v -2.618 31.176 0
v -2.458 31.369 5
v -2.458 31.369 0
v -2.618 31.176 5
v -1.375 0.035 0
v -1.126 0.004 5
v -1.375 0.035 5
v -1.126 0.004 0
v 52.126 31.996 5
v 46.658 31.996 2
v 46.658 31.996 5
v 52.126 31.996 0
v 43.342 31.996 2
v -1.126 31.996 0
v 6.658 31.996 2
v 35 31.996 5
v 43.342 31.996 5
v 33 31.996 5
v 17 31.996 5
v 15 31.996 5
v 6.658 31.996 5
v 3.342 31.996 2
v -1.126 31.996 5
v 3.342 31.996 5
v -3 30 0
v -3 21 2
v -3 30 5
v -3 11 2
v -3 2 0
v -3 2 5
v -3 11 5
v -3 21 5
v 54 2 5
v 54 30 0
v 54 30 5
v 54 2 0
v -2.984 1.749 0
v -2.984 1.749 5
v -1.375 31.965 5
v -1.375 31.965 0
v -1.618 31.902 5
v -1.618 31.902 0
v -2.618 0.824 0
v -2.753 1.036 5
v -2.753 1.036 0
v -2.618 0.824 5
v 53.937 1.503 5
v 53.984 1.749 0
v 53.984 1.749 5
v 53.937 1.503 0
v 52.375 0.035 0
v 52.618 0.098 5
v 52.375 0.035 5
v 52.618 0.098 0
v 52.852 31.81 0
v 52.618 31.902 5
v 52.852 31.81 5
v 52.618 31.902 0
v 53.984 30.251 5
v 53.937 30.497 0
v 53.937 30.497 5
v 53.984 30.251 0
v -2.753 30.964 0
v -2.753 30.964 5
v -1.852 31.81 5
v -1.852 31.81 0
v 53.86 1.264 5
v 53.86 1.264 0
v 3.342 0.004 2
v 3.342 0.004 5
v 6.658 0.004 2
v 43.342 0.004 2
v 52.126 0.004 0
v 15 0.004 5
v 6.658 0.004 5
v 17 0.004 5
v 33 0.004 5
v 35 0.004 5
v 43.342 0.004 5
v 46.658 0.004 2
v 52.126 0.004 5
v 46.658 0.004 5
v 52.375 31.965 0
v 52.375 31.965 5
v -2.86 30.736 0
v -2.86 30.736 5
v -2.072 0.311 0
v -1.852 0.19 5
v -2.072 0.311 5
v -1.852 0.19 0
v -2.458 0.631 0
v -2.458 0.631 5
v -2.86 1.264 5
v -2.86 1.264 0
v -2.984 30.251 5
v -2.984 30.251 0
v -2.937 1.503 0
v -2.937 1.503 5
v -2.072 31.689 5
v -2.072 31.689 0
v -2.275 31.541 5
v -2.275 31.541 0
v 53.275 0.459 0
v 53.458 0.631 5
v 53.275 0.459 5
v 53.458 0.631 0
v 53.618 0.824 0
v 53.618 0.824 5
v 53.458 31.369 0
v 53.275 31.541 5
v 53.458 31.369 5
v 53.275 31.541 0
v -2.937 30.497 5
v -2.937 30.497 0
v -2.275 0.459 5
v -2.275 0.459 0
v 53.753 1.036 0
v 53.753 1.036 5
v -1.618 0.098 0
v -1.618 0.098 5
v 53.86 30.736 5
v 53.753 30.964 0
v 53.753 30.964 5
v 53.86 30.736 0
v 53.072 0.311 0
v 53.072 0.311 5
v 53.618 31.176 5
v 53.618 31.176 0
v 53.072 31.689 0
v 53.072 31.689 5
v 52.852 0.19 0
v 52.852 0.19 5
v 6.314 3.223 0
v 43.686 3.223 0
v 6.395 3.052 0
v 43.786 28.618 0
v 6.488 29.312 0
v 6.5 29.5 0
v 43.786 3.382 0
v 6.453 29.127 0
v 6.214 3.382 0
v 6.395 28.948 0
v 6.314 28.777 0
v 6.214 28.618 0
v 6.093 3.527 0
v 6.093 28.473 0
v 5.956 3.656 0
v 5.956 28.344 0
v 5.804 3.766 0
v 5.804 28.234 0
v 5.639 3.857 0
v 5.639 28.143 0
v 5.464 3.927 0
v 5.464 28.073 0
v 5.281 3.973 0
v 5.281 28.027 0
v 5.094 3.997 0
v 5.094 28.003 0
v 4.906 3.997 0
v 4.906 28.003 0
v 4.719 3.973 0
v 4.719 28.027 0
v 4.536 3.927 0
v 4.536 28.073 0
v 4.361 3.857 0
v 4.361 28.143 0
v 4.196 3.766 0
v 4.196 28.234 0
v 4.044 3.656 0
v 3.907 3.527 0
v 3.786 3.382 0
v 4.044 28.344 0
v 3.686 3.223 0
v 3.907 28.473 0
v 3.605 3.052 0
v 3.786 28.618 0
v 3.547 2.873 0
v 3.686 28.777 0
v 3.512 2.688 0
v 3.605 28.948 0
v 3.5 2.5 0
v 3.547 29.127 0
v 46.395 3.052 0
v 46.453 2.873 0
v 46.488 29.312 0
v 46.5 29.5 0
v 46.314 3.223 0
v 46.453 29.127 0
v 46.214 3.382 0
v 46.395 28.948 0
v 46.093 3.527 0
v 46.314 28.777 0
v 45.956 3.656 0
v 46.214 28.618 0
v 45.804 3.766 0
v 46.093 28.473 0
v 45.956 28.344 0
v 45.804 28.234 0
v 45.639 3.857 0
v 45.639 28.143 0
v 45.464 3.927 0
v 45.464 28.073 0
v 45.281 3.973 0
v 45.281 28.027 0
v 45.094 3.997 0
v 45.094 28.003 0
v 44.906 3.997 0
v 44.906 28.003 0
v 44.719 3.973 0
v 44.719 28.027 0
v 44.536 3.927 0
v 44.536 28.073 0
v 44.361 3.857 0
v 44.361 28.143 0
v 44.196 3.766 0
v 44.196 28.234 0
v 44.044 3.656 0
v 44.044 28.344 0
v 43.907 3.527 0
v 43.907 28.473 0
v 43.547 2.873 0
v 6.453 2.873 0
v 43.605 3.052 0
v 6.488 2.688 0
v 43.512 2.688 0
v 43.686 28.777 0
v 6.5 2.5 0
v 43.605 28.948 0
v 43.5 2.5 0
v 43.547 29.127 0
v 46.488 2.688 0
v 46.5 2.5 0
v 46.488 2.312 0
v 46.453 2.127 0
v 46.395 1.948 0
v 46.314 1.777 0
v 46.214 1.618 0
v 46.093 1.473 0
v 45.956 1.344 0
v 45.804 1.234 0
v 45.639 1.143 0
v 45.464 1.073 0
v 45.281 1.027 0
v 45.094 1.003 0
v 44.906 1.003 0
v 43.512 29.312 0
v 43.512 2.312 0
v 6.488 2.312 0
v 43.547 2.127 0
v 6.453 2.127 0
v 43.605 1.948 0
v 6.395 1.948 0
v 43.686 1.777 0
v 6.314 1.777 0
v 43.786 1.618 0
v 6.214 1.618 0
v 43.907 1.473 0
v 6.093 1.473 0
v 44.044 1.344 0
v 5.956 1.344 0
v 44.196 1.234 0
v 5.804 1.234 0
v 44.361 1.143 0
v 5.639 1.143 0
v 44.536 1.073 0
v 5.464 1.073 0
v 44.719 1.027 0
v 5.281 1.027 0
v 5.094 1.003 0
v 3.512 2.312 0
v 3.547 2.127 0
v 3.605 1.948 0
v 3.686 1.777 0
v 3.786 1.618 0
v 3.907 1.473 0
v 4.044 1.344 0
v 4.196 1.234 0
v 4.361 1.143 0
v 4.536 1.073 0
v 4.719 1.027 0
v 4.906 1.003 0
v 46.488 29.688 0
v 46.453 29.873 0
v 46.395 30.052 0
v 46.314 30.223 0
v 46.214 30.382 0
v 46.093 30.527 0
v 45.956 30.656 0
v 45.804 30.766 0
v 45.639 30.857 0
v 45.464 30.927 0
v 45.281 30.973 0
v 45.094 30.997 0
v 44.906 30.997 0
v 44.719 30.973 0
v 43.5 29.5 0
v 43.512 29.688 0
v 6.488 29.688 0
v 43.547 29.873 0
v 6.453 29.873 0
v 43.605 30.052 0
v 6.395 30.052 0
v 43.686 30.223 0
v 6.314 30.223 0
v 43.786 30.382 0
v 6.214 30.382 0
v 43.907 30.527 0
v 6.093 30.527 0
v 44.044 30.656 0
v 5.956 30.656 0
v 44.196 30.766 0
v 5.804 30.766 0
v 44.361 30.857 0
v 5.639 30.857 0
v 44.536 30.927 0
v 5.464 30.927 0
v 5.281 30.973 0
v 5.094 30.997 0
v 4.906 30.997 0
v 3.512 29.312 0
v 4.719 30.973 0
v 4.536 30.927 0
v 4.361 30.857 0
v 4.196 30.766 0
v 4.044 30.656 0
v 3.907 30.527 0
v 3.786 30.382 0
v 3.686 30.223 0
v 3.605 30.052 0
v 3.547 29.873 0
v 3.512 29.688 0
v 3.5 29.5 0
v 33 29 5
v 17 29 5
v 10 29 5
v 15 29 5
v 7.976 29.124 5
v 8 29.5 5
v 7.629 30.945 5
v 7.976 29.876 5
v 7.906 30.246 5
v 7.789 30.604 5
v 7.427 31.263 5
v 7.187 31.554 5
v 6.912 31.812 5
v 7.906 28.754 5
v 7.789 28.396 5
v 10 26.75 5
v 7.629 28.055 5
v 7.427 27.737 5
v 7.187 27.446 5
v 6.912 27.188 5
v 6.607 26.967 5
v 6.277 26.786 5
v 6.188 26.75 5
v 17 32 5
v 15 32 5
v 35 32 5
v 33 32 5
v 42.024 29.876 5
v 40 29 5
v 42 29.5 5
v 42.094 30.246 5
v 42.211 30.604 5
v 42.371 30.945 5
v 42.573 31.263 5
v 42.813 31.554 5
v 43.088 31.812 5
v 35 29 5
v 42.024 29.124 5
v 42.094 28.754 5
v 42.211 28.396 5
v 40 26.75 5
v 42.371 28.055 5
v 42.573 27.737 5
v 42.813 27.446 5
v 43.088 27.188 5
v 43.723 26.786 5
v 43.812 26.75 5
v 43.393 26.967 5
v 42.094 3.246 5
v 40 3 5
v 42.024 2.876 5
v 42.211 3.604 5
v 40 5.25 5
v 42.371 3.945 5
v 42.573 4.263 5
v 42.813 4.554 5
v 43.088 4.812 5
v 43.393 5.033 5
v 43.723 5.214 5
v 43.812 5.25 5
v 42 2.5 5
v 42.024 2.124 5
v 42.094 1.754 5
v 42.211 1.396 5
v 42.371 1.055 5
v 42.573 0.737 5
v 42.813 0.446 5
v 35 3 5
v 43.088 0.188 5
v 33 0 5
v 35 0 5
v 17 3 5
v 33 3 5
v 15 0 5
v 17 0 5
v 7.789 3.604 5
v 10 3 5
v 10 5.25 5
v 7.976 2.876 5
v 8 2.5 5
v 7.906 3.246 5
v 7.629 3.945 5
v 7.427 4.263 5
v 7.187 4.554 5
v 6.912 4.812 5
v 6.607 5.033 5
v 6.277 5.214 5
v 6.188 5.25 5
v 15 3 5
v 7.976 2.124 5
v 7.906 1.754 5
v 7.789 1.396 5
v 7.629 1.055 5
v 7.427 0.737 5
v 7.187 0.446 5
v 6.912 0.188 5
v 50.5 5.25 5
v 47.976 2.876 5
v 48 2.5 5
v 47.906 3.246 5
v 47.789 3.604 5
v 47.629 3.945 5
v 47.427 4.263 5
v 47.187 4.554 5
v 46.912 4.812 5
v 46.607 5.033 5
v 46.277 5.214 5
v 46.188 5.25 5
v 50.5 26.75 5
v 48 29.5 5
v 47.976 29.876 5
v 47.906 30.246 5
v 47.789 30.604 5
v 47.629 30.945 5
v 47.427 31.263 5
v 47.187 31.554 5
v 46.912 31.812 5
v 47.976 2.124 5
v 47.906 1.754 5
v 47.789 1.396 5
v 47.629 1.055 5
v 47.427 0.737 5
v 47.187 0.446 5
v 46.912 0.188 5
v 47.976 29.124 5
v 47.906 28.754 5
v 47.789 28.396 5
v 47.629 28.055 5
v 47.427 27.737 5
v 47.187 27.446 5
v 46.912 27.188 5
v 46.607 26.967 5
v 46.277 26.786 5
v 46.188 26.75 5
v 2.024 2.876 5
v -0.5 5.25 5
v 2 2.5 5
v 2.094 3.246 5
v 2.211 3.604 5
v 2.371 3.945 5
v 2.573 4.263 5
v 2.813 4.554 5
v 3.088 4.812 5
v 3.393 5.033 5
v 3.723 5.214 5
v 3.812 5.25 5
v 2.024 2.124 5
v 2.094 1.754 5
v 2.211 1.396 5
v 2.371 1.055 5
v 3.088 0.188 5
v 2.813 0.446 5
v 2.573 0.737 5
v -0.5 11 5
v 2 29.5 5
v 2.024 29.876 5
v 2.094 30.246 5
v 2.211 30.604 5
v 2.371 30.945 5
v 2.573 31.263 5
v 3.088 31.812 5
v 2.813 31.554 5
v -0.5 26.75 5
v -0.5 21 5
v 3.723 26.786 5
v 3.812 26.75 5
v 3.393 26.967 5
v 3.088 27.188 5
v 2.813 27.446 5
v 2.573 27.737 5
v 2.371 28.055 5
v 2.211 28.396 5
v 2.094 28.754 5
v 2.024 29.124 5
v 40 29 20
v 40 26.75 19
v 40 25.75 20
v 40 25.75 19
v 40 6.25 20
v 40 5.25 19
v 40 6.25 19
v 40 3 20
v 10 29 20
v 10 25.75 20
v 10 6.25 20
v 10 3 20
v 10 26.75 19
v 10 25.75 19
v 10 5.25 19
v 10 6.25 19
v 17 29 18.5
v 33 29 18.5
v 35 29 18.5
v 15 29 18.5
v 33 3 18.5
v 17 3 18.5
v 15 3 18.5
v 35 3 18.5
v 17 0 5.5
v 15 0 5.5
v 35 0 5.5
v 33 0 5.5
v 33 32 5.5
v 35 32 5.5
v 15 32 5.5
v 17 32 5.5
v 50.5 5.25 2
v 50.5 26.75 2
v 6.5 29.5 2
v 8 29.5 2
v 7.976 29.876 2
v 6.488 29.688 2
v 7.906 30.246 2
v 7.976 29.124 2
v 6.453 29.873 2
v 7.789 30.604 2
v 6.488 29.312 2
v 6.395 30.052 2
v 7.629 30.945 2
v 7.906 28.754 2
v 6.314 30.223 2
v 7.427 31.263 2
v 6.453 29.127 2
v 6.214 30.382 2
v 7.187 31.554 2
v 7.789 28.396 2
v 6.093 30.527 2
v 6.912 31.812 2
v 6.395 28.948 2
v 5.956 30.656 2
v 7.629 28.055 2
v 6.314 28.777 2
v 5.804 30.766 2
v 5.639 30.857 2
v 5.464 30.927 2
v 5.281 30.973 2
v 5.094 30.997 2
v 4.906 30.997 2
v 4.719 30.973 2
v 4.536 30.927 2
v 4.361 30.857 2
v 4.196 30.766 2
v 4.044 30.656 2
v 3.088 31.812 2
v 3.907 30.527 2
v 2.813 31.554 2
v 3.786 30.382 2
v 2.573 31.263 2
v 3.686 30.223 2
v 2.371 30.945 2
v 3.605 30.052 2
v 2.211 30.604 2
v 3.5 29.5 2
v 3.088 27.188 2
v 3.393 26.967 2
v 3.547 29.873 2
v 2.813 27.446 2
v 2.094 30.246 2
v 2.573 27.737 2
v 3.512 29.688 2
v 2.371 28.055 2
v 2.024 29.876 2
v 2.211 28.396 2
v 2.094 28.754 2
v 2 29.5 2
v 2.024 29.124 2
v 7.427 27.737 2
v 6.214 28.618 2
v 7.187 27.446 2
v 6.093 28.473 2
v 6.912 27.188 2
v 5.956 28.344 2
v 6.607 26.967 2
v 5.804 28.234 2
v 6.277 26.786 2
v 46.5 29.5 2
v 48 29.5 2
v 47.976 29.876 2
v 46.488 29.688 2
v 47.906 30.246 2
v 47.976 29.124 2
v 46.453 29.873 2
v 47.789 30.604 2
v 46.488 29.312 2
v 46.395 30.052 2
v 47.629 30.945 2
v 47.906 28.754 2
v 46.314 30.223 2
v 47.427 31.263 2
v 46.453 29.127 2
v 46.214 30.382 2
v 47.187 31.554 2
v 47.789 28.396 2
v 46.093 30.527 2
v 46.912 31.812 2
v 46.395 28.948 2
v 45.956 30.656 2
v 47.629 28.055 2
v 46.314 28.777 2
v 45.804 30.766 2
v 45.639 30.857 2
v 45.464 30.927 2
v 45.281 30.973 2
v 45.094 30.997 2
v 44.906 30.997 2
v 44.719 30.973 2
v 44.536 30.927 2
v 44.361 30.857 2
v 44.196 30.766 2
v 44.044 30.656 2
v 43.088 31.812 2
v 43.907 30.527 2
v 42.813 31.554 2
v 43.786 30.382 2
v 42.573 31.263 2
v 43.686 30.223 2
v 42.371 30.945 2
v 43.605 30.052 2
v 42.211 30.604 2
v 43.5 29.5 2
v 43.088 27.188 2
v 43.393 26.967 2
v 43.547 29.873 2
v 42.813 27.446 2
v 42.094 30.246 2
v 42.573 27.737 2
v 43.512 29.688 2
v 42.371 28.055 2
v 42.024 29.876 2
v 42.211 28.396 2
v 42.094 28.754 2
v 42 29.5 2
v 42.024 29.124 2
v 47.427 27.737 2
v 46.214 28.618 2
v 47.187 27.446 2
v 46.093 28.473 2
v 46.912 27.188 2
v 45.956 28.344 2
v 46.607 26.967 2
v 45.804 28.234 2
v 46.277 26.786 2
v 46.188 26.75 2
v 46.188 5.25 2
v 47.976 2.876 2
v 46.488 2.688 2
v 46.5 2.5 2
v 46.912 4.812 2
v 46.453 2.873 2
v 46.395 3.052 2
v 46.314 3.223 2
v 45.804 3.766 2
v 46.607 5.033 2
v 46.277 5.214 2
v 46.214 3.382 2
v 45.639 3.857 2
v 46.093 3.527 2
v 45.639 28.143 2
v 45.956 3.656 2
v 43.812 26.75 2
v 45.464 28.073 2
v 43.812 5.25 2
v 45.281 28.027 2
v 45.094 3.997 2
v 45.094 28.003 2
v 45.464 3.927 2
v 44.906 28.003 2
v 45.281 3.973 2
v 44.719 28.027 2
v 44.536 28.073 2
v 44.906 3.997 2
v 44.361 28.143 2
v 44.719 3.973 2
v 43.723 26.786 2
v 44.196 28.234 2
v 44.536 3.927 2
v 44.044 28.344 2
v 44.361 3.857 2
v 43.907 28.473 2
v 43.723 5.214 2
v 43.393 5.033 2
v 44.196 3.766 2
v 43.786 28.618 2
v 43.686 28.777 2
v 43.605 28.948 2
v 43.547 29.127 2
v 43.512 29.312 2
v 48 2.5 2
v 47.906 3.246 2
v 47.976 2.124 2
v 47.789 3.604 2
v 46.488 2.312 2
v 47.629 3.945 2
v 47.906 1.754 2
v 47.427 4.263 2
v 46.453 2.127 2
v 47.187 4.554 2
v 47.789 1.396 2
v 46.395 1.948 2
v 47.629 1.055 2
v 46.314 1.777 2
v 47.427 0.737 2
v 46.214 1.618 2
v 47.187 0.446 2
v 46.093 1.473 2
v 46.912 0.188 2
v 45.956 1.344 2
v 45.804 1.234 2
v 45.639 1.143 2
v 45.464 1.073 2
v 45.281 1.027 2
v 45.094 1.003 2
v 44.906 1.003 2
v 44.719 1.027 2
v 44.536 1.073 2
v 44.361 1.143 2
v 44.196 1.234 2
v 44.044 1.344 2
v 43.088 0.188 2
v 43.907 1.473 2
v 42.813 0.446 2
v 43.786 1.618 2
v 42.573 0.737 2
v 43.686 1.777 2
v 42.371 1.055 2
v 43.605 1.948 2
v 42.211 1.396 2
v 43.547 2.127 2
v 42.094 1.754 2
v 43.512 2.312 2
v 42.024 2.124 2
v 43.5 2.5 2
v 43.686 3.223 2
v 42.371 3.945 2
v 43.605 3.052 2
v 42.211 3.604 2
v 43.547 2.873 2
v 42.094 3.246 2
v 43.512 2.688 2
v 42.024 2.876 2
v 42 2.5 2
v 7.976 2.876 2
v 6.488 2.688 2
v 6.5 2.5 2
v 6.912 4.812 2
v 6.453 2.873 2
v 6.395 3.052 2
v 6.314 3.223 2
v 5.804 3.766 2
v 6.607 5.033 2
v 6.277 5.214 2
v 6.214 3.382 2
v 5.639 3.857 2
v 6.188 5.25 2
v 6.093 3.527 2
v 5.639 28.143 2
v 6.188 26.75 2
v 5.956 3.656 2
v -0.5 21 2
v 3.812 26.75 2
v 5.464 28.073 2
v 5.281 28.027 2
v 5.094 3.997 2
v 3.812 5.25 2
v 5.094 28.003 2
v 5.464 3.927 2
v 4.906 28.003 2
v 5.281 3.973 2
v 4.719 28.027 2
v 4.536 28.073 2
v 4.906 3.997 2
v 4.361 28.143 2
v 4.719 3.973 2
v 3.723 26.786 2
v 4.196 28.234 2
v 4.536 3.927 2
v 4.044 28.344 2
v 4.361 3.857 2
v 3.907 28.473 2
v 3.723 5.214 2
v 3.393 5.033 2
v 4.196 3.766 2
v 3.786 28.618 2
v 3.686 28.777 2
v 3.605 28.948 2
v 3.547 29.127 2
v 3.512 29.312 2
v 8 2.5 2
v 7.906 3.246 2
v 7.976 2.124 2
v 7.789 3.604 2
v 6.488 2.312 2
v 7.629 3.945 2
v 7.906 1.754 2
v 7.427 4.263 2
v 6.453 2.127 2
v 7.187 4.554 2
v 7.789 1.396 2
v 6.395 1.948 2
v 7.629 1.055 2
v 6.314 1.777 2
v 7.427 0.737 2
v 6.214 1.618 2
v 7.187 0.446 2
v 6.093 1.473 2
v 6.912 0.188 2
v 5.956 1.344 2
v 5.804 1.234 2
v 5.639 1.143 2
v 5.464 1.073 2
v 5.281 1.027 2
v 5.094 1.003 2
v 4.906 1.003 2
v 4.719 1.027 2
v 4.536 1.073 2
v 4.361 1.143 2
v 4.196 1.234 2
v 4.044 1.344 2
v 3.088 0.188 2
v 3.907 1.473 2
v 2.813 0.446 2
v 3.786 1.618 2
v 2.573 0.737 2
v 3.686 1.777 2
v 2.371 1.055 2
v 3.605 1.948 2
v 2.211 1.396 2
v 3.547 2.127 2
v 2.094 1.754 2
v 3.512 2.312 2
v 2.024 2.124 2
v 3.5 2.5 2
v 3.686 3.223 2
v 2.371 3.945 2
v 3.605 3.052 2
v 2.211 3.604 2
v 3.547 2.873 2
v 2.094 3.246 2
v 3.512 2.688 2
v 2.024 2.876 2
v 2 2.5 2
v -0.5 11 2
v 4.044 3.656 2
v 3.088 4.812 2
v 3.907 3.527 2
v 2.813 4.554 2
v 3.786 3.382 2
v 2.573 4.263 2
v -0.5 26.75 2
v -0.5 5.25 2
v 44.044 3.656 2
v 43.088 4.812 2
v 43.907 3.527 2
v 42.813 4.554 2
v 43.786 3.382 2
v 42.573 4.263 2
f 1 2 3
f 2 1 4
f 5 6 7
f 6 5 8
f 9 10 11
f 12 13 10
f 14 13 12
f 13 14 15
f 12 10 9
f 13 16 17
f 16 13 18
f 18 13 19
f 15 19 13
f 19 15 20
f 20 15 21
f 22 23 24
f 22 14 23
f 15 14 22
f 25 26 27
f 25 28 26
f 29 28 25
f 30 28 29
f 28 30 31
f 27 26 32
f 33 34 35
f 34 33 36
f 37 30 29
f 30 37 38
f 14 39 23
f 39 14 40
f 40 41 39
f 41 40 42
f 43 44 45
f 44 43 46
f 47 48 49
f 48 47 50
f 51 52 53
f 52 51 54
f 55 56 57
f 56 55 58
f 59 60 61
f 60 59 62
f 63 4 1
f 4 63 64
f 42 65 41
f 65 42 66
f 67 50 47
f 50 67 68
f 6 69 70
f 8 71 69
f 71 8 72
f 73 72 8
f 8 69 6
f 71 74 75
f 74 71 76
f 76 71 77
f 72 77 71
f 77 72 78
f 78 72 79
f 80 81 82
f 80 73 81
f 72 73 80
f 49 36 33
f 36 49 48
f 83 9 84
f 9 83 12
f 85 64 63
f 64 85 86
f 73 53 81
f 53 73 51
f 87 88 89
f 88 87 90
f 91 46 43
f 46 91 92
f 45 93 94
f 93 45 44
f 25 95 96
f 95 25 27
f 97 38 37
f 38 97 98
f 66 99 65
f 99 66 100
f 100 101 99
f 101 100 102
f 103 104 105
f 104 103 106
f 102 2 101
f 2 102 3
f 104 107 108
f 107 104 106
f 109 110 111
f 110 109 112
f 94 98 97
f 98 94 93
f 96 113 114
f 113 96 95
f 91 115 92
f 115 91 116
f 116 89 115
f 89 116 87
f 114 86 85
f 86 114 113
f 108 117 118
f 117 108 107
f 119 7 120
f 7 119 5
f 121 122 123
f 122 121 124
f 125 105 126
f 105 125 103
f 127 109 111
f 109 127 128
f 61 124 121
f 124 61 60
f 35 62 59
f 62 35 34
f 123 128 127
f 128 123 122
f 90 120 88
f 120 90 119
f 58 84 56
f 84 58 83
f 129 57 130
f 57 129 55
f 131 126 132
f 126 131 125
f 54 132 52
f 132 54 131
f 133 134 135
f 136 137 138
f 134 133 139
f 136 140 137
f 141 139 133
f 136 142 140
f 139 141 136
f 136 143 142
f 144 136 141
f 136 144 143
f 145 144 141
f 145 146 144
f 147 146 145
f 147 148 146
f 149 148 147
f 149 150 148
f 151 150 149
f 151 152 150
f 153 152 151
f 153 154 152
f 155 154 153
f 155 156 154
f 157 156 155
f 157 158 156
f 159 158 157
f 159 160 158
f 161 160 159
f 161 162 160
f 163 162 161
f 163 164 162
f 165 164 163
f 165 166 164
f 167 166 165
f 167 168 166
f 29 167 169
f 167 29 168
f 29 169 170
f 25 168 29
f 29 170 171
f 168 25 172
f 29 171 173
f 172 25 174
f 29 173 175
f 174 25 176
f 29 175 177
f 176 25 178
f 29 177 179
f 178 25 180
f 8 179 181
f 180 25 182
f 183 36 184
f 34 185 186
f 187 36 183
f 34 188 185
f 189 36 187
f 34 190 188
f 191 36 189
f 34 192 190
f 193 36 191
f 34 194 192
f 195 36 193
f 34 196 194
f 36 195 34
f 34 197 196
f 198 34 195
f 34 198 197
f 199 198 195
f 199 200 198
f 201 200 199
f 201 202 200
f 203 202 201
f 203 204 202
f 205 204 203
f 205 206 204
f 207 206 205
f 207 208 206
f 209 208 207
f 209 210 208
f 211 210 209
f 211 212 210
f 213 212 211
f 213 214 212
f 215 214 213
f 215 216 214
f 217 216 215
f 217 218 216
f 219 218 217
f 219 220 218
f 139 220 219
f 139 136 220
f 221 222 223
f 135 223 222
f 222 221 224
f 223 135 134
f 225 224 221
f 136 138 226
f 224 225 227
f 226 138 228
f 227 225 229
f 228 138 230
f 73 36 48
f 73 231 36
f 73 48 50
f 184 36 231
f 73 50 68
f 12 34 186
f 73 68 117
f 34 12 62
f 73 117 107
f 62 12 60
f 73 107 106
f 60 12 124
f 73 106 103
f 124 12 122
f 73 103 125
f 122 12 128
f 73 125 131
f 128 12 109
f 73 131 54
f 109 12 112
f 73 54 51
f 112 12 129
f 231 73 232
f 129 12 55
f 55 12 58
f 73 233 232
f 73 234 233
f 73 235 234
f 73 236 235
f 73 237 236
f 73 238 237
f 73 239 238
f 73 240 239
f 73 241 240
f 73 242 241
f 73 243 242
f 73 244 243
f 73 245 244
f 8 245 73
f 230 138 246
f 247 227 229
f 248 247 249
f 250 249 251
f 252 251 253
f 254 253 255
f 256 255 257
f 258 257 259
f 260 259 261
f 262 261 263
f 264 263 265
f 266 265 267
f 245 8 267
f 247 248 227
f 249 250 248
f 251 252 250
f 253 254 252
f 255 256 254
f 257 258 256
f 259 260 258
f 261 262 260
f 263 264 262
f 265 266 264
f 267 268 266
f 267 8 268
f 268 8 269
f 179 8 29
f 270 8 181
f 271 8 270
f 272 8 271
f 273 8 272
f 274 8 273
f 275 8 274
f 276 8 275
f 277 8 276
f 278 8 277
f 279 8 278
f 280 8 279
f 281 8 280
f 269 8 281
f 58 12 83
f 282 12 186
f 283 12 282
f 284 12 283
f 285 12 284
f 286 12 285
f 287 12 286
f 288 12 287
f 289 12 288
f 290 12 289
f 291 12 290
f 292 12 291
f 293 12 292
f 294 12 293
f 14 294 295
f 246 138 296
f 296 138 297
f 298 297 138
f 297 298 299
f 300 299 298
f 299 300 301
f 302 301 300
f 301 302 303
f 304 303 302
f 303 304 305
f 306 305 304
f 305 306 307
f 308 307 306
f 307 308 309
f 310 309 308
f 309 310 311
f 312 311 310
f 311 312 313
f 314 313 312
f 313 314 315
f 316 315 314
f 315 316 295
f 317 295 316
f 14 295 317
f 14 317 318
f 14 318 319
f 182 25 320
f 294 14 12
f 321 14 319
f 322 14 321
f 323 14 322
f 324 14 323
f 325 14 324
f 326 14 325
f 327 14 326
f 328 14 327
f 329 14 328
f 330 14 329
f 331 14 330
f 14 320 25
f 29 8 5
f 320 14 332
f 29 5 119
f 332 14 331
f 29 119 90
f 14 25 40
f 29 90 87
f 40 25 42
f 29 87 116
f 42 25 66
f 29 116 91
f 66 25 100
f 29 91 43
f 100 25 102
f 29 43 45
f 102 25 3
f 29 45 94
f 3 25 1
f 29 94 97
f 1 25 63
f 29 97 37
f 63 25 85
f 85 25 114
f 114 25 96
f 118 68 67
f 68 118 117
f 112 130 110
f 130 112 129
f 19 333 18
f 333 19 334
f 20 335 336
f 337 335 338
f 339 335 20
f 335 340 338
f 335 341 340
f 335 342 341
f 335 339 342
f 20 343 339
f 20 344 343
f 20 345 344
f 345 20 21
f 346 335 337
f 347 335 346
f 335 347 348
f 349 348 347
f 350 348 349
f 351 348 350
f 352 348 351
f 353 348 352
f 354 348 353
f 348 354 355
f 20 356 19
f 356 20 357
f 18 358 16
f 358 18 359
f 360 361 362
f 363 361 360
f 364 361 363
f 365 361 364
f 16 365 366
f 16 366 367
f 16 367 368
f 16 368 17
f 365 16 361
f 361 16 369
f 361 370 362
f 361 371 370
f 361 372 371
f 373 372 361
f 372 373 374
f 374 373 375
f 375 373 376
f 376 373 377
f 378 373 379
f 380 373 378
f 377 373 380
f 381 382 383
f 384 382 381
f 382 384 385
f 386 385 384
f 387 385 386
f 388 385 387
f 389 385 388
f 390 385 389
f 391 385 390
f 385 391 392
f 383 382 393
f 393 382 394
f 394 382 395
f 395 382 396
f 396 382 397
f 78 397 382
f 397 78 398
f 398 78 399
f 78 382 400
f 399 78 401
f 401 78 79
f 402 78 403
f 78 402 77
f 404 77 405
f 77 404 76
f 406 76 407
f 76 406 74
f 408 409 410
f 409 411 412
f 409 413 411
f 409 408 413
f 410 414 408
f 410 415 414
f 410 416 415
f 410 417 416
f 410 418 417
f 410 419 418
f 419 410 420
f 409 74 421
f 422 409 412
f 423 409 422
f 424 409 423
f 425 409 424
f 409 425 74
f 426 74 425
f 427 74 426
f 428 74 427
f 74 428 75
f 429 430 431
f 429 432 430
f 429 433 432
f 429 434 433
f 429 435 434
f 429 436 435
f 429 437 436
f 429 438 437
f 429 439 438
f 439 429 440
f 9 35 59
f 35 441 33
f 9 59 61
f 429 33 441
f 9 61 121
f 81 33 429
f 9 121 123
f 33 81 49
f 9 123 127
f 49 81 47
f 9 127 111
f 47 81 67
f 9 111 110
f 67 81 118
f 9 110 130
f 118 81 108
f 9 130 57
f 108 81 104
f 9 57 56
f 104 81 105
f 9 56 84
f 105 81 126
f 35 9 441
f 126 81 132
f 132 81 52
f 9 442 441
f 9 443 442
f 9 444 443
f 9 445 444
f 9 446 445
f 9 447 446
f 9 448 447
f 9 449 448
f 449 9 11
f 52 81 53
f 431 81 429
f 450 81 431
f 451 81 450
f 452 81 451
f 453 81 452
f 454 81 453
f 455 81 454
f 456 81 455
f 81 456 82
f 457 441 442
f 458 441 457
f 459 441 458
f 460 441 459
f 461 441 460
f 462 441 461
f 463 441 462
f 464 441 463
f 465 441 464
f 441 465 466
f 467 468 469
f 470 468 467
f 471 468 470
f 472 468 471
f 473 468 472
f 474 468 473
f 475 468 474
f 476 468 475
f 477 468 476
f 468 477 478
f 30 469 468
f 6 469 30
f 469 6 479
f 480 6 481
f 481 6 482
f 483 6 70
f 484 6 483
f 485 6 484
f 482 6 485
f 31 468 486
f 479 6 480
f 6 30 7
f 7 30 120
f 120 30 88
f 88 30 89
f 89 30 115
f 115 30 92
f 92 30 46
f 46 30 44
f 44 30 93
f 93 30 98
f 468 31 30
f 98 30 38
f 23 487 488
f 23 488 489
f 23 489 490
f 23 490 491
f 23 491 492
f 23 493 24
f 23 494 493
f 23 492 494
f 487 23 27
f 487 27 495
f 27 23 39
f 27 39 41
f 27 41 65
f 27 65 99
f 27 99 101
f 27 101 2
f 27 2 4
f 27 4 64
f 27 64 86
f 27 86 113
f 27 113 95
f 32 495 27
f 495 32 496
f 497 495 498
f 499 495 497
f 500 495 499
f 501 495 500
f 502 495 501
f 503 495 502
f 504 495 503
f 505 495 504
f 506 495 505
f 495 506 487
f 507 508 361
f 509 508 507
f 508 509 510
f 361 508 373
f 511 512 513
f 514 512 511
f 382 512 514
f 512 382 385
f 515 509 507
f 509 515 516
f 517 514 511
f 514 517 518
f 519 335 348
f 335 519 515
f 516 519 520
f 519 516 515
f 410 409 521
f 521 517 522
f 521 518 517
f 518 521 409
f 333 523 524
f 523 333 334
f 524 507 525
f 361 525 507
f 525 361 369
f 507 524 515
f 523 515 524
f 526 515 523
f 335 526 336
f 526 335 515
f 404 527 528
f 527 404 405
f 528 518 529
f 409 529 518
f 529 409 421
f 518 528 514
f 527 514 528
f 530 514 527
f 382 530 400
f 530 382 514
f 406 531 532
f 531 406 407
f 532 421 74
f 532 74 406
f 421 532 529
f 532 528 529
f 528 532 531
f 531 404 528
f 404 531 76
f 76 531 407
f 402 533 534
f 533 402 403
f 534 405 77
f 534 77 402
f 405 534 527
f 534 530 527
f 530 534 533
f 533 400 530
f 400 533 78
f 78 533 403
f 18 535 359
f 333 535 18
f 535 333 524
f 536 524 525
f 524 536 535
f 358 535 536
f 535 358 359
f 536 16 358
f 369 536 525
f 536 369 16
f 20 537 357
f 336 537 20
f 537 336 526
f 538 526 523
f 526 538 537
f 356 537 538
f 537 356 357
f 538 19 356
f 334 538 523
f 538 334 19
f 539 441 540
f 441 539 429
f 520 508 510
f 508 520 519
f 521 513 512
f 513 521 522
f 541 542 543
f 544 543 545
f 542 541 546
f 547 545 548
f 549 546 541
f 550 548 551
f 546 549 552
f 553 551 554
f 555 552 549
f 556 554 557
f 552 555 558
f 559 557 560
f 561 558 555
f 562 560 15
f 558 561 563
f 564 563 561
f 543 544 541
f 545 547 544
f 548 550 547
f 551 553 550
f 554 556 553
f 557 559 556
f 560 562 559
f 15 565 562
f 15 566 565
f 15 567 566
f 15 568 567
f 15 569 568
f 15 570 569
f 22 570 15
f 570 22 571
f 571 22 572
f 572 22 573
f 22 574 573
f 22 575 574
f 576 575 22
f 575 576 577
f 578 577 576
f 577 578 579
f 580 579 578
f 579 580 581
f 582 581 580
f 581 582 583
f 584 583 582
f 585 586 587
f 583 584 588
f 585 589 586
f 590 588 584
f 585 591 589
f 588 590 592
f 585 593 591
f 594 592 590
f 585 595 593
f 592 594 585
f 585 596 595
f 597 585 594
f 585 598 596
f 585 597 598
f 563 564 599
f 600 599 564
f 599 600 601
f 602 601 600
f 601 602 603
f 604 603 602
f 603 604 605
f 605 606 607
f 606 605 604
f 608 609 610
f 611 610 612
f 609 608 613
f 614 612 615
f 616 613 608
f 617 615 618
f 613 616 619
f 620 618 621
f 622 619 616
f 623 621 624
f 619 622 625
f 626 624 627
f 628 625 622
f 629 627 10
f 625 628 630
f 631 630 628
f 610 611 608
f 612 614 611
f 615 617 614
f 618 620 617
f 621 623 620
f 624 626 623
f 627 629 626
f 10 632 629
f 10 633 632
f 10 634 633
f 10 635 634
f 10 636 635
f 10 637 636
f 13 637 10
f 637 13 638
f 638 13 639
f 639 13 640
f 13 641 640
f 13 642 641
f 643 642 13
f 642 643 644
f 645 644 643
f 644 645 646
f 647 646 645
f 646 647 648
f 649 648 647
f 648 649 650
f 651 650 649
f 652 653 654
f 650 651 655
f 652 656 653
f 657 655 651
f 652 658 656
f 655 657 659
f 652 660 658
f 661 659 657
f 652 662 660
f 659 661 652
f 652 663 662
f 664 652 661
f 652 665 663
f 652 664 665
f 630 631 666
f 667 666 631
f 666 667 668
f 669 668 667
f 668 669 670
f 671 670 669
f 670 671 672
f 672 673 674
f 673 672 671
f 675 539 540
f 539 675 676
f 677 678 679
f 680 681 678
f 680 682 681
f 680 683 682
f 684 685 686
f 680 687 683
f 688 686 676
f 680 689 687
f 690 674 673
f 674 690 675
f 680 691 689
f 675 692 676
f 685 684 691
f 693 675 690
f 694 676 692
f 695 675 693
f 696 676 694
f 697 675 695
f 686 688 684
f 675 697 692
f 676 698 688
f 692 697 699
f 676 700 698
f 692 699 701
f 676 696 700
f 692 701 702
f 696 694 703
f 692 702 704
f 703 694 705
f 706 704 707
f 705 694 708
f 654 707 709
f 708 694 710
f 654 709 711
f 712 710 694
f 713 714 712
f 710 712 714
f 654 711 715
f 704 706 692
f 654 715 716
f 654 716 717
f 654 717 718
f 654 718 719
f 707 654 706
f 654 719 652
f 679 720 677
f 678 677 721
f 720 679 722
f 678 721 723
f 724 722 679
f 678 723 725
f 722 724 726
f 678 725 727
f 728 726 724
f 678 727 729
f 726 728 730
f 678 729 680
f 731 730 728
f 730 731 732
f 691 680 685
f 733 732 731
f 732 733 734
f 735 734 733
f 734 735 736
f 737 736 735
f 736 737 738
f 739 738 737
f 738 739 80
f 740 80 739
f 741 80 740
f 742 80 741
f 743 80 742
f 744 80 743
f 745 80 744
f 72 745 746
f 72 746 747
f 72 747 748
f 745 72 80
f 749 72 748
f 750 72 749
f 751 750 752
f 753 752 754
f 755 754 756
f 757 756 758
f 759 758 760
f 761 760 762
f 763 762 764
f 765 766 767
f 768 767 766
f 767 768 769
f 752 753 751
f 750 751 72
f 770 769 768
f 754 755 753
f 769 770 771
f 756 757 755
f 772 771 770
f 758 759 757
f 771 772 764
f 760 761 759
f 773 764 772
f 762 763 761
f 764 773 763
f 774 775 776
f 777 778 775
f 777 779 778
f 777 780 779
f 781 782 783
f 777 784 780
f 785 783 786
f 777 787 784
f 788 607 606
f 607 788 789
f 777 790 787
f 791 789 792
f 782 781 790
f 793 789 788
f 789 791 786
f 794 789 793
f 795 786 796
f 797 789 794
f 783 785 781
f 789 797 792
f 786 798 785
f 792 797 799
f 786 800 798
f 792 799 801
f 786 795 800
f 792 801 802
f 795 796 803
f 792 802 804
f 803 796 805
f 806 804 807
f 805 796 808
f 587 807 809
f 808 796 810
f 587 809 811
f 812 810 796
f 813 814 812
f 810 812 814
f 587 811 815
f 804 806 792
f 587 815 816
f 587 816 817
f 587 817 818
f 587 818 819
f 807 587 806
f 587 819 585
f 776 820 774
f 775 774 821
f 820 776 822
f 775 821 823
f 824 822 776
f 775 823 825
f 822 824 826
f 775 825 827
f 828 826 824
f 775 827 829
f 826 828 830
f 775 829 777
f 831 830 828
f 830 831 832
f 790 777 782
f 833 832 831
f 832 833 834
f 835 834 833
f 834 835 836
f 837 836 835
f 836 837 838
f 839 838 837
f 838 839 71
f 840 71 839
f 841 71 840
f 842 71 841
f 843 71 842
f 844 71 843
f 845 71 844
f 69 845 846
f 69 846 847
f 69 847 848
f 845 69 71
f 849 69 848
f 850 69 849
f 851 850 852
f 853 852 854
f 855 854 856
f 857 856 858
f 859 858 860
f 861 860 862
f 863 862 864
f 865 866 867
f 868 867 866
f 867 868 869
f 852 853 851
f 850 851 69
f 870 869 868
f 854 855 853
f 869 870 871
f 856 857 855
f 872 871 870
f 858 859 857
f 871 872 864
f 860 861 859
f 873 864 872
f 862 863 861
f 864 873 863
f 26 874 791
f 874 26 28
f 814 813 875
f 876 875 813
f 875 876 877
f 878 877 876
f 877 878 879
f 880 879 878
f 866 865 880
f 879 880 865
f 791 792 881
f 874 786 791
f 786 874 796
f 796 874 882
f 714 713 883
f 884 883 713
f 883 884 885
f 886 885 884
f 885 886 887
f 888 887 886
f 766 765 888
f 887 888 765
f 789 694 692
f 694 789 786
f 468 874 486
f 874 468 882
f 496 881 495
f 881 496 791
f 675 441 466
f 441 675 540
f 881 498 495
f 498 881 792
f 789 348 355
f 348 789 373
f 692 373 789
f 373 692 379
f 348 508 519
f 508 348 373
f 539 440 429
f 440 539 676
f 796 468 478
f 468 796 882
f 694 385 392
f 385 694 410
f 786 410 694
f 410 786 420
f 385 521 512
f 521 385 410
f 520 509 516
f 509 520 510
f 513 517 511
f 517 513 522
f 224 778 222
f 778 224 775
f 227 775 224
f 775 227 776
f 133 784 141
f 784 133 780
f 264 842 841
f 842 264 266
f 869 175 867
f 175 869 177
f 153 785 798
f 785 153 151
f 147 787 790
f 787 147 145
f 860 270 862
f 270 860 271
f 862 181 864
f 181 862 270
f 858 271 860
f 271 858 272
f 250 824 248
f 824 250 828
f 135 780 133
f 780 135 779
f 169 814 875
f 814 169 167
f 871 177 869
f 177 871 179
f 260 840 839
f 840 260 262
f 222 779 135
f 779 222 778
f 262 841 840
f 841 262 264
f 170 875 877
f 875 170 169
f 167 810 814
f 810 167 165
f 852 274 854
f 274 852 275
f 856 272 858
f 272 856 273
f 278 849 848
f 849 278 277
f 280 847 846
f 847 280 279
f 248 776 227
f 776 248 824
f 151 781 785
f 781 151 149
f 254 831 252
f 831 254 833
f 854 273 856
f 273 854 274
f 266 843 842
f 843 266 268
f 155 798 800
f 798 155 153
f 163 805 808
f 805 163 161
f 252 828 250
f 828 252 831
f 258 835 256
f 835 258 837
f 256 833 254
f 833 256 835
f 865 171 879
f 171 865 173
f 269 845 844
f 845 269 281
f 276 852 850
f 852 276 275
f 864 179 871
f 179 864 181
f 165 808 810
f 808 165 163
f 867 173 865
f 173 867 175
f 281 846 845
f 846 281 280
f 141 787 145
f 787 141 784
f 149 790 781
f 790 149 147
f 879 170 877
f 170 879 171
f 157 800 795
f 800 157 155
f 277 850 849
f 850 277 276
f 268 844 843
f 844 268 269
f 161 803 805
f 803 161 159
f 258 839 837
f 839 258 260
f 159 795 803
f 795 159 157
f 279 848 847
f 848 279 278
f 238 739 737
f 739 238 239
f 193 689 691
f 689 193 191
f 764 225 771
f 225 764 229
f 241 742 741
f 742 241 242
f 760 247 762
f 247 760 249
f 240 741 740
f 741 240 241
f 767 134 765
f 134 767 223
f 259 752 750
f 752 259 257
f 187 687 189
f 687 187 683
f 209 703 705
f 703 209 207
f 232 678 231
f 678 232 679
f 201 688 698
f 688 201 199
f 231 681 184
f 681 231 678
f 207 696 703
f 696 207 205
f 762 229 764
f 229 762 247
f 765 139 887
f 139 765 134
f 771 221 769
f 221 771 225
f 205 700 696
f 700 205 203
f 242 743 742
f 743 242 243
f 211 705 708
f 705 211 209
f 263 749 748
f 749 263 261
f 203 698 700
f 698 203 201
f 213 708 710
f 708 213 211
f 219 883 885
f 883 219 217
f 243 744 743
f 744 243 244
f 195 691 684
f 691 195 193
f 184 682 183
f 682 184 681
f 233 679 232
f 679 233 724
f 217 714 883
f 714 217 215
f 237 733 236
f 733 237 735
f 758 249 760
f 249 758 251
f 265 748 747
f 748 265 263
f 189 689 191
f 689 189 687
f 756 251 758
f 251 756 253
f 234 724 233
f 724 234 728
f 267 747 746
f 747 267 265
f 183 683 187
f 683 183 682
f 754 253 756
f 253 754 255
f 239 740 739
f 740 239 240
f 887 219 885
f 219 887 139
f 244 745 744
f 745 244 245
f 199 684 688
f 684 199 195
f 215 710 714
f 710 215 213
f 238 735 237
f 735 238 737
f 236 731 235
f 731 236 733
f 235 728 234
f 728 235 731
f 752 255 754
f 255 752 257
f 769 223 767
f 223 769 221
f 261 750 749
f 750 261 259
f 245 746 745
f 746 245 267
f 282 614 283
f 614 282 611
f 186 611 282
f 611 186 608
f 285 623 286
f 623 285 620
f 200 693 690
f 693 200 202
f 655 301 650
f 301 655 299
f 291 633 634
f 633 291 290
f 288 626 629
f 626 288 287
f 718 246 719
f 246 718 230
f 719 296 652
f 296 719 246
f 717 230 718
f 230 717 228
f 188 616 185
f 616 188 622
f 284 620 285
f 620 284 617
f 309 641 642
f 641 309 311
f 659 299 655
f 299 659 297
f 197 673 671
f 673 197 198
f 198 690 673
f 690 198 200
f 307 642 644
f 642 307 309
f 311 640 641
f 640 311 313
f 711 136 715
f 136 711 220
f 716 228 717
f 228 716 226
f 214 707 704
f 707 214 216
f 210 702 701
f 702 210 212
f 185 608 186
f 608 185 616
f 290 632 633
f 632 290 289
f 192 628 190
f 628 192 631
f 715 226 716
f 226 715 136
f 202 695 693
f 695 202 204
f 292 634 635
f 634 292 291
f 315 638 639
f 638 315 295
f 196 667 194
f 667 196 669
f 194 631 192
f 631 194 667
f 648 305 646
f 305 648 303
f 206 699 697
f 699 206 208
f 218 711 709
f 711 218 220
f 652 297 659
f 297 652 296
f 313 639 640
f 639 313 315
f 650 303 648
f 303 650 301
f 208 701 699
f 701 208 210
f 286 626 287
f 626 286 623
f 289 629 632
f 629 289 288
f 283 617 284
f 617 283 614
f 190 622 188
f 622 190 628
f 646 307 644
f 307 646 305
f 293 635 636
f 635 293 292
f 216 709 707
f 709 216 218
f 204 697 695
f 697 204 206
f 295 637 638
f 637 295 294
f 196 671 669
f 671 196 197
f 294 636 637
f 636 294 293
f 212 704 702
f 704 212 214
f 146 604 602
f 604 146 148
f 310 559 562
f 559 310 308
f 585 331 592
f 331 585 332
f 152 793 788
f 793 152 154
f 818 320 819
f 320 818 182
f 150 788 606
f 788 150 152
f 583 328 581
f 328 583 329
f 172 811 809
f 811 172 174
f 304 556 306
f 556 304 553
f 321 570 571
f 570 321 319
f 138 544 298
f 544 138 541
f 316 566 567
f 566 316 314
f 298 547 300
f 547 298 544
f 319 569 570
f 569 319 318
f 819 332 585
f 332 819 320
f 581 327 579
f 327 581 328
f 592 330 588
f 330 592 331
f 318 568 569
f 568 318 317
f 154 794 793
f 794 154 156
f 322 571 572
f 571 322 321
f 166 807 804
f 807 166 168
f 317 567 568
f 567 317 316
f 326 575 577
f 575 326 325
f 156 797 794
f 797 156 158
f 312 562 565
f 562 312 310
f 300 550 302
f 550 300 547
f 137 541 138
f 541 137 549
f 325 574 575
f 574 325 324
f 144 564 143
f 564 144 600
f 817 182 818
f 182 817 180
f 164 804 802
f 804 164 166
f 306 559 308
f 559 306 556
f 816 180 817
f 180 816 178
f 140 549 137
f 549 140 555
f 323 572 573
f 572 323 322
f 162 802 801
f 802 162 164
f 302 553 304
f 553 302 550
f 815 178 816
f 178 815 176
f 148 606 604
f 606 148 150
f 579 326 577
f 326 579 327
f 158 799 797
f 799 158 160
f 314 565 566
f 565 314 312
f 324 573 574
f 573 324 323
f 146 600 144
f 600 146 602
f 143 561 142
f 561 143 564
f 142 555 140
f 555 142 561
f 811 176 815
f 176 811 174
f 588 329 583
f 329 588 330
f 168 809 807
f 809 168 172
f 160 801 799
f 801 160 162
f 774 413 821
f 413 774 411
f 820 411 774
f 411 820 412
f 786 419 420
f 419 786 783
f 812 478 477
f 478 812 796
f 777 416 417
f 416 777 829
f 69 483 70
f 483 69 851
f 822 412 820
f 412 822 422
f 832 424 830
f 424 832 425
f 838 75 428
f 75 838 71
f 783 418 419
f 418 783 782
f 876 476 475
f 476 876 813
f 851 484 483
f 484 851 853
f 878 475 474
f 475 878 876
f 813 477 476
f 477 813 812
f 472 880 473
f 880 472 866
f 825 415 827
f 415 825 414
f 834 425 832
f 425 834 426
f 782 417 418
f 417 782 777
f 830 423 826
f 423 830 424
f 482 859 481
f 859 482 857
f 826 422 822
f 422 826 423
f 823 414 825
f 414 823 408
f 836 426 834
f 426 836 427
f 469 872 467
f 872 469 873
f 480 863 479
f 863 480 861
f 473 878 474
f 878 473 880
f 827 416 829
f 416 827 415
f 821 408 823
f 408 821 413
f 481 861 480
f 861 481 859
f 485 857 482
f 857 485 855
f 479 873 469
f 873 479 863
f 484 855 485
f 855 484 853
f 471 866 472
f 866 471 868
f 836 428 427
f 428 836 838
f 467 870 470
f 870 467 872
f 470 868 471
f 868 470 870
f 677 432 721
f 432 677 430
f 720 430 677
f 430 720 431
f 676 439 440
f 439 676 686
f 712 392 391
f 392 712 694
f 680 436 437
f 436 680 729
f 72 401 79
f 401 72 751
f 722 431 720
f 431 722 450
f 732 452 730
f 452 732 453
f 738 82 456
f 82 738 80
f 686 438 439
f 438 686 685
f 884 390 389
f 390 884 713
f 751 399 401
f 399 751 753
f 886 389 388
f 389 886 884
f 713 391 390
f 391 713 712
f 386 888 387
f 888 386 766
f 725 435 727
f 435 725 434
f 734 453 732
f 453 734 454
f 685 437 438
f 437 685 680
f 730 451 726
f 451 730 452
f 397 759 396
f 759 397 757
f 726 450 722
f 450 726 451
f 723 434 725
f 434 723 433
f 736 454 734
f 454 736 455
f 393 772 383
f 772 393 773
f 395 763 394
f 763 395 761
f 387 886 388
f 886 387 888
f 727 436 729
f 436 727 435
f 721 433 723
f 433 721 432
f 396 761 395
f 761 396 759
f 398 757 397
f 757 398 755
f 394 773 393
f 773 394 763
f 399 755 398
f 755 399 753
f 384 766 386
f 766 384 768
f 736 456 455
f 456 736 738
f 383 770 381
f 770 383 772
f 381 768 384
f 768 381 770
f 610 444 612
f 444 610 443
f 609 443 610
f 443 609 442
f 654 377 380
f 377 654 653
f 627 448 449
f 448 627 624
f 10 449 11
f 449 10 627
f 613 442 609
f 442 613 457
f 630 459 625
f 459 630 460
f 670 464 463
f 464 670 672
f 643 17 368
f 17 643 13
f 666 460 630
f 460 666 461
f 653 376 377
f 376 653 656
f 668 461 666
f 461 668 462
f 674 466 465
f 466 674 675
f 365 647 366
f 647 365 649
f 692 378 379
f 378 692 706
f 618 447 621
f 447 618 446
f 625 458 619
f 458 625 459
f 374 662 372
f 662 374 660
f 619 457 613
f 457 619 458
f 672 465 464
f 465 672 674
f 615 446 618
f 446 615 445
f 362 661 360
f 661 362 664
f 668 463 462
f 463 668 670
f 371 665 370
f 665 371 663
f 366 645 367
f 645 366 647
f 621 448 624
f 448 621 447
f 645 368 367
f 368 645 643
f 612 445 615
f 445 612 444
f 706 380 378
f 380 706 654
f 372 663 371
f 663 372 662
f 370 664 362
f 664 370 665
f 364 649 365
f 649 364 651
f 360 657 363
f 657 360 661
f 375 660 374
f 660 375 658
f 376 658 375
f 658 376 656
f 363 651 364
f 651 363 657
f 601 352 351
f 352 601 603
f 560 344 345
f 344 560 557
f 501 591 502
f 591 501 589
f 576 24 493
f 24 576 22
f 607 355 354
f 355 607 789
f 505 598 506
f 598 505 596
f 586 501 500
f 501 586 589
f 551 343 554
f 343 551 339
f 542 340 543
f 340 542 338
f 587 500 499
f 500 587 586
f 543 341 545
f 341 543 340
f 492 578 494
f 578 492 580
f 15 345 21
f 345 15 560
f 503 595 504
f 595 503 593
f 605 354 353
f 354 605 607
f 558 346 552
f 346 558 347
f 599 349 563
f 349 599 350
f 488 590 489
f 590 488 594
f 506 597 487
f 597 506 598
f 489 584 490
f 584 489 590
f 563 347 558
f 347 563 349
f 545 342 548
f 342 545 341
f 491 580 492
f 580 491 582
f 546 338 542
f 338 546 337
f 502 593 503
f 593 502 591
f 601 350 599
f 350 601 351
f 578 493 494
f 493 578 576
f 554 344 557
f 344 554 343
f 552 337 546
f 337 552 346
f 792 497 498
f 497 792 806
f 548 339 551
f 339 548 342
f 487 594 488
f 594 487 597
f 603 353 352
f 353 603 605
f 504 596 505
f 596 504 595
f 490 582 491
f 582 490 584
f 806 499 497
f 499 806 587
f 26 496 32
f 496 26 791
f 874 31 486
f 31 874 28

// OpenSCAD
$fn=50;

difference(){
    union(){
hull(){
    translate([-1,2,0])cylinder(d=4,h=5);
    translate([54-2,2,0])cylinder(d=4,h=5);
    translate([54-2,32-2,0])cylinder(d=4,h=5);
    translate([-1,32-2,0])cylinder(d=4,h=5);
}
translate([10,3,3])cube([30,26,17]);

translate([15,0,5])hull(){
    cube([2,3,0.5]);
    translate([0,3,13])cube([2,1,0.5]);
}
translate([33,0,5])hull(){
    cube([2,3,0.5]);
    translate([0,3,13])cube([2,1,0.5]);
}
translate([33,29,5])hull(){
    cube([2,3,0.5]);
    translate([0,-1,13])cube([2,1,0.5]);
}
translate([15,29,5])hull(){
    cube([2,3,0.5]);
    translate([0,-1,13])cube([2,1,0.5]);
}

}

translate([-0.5,5.25,2])cube([51,21.5,17]);

translate([9,6.25,3])cube([32,19.5,26]);

translate([5,2.5,0])cylinder(d=3,h=10);
translate([50-5,2.5,0])cylinder(d=3,h=10);
translate([50-5,32-2.5,0])cylinder(d=3,h=10);
translate([5,32-2.5,0])cylinder(d=3,h=10);

translate([5,2.5,2])cylinder(d=6,h=10);
translate([50-5,2.5,2])cylinder(d=6,h=10);
translate([50-5,32-2.5,2])cylinder(d=6,h=10);
translate([5,32-2.5,2])cylinder(d=6,h=10);

translate([-4,11,2])cube([10,10,10,]);
}
